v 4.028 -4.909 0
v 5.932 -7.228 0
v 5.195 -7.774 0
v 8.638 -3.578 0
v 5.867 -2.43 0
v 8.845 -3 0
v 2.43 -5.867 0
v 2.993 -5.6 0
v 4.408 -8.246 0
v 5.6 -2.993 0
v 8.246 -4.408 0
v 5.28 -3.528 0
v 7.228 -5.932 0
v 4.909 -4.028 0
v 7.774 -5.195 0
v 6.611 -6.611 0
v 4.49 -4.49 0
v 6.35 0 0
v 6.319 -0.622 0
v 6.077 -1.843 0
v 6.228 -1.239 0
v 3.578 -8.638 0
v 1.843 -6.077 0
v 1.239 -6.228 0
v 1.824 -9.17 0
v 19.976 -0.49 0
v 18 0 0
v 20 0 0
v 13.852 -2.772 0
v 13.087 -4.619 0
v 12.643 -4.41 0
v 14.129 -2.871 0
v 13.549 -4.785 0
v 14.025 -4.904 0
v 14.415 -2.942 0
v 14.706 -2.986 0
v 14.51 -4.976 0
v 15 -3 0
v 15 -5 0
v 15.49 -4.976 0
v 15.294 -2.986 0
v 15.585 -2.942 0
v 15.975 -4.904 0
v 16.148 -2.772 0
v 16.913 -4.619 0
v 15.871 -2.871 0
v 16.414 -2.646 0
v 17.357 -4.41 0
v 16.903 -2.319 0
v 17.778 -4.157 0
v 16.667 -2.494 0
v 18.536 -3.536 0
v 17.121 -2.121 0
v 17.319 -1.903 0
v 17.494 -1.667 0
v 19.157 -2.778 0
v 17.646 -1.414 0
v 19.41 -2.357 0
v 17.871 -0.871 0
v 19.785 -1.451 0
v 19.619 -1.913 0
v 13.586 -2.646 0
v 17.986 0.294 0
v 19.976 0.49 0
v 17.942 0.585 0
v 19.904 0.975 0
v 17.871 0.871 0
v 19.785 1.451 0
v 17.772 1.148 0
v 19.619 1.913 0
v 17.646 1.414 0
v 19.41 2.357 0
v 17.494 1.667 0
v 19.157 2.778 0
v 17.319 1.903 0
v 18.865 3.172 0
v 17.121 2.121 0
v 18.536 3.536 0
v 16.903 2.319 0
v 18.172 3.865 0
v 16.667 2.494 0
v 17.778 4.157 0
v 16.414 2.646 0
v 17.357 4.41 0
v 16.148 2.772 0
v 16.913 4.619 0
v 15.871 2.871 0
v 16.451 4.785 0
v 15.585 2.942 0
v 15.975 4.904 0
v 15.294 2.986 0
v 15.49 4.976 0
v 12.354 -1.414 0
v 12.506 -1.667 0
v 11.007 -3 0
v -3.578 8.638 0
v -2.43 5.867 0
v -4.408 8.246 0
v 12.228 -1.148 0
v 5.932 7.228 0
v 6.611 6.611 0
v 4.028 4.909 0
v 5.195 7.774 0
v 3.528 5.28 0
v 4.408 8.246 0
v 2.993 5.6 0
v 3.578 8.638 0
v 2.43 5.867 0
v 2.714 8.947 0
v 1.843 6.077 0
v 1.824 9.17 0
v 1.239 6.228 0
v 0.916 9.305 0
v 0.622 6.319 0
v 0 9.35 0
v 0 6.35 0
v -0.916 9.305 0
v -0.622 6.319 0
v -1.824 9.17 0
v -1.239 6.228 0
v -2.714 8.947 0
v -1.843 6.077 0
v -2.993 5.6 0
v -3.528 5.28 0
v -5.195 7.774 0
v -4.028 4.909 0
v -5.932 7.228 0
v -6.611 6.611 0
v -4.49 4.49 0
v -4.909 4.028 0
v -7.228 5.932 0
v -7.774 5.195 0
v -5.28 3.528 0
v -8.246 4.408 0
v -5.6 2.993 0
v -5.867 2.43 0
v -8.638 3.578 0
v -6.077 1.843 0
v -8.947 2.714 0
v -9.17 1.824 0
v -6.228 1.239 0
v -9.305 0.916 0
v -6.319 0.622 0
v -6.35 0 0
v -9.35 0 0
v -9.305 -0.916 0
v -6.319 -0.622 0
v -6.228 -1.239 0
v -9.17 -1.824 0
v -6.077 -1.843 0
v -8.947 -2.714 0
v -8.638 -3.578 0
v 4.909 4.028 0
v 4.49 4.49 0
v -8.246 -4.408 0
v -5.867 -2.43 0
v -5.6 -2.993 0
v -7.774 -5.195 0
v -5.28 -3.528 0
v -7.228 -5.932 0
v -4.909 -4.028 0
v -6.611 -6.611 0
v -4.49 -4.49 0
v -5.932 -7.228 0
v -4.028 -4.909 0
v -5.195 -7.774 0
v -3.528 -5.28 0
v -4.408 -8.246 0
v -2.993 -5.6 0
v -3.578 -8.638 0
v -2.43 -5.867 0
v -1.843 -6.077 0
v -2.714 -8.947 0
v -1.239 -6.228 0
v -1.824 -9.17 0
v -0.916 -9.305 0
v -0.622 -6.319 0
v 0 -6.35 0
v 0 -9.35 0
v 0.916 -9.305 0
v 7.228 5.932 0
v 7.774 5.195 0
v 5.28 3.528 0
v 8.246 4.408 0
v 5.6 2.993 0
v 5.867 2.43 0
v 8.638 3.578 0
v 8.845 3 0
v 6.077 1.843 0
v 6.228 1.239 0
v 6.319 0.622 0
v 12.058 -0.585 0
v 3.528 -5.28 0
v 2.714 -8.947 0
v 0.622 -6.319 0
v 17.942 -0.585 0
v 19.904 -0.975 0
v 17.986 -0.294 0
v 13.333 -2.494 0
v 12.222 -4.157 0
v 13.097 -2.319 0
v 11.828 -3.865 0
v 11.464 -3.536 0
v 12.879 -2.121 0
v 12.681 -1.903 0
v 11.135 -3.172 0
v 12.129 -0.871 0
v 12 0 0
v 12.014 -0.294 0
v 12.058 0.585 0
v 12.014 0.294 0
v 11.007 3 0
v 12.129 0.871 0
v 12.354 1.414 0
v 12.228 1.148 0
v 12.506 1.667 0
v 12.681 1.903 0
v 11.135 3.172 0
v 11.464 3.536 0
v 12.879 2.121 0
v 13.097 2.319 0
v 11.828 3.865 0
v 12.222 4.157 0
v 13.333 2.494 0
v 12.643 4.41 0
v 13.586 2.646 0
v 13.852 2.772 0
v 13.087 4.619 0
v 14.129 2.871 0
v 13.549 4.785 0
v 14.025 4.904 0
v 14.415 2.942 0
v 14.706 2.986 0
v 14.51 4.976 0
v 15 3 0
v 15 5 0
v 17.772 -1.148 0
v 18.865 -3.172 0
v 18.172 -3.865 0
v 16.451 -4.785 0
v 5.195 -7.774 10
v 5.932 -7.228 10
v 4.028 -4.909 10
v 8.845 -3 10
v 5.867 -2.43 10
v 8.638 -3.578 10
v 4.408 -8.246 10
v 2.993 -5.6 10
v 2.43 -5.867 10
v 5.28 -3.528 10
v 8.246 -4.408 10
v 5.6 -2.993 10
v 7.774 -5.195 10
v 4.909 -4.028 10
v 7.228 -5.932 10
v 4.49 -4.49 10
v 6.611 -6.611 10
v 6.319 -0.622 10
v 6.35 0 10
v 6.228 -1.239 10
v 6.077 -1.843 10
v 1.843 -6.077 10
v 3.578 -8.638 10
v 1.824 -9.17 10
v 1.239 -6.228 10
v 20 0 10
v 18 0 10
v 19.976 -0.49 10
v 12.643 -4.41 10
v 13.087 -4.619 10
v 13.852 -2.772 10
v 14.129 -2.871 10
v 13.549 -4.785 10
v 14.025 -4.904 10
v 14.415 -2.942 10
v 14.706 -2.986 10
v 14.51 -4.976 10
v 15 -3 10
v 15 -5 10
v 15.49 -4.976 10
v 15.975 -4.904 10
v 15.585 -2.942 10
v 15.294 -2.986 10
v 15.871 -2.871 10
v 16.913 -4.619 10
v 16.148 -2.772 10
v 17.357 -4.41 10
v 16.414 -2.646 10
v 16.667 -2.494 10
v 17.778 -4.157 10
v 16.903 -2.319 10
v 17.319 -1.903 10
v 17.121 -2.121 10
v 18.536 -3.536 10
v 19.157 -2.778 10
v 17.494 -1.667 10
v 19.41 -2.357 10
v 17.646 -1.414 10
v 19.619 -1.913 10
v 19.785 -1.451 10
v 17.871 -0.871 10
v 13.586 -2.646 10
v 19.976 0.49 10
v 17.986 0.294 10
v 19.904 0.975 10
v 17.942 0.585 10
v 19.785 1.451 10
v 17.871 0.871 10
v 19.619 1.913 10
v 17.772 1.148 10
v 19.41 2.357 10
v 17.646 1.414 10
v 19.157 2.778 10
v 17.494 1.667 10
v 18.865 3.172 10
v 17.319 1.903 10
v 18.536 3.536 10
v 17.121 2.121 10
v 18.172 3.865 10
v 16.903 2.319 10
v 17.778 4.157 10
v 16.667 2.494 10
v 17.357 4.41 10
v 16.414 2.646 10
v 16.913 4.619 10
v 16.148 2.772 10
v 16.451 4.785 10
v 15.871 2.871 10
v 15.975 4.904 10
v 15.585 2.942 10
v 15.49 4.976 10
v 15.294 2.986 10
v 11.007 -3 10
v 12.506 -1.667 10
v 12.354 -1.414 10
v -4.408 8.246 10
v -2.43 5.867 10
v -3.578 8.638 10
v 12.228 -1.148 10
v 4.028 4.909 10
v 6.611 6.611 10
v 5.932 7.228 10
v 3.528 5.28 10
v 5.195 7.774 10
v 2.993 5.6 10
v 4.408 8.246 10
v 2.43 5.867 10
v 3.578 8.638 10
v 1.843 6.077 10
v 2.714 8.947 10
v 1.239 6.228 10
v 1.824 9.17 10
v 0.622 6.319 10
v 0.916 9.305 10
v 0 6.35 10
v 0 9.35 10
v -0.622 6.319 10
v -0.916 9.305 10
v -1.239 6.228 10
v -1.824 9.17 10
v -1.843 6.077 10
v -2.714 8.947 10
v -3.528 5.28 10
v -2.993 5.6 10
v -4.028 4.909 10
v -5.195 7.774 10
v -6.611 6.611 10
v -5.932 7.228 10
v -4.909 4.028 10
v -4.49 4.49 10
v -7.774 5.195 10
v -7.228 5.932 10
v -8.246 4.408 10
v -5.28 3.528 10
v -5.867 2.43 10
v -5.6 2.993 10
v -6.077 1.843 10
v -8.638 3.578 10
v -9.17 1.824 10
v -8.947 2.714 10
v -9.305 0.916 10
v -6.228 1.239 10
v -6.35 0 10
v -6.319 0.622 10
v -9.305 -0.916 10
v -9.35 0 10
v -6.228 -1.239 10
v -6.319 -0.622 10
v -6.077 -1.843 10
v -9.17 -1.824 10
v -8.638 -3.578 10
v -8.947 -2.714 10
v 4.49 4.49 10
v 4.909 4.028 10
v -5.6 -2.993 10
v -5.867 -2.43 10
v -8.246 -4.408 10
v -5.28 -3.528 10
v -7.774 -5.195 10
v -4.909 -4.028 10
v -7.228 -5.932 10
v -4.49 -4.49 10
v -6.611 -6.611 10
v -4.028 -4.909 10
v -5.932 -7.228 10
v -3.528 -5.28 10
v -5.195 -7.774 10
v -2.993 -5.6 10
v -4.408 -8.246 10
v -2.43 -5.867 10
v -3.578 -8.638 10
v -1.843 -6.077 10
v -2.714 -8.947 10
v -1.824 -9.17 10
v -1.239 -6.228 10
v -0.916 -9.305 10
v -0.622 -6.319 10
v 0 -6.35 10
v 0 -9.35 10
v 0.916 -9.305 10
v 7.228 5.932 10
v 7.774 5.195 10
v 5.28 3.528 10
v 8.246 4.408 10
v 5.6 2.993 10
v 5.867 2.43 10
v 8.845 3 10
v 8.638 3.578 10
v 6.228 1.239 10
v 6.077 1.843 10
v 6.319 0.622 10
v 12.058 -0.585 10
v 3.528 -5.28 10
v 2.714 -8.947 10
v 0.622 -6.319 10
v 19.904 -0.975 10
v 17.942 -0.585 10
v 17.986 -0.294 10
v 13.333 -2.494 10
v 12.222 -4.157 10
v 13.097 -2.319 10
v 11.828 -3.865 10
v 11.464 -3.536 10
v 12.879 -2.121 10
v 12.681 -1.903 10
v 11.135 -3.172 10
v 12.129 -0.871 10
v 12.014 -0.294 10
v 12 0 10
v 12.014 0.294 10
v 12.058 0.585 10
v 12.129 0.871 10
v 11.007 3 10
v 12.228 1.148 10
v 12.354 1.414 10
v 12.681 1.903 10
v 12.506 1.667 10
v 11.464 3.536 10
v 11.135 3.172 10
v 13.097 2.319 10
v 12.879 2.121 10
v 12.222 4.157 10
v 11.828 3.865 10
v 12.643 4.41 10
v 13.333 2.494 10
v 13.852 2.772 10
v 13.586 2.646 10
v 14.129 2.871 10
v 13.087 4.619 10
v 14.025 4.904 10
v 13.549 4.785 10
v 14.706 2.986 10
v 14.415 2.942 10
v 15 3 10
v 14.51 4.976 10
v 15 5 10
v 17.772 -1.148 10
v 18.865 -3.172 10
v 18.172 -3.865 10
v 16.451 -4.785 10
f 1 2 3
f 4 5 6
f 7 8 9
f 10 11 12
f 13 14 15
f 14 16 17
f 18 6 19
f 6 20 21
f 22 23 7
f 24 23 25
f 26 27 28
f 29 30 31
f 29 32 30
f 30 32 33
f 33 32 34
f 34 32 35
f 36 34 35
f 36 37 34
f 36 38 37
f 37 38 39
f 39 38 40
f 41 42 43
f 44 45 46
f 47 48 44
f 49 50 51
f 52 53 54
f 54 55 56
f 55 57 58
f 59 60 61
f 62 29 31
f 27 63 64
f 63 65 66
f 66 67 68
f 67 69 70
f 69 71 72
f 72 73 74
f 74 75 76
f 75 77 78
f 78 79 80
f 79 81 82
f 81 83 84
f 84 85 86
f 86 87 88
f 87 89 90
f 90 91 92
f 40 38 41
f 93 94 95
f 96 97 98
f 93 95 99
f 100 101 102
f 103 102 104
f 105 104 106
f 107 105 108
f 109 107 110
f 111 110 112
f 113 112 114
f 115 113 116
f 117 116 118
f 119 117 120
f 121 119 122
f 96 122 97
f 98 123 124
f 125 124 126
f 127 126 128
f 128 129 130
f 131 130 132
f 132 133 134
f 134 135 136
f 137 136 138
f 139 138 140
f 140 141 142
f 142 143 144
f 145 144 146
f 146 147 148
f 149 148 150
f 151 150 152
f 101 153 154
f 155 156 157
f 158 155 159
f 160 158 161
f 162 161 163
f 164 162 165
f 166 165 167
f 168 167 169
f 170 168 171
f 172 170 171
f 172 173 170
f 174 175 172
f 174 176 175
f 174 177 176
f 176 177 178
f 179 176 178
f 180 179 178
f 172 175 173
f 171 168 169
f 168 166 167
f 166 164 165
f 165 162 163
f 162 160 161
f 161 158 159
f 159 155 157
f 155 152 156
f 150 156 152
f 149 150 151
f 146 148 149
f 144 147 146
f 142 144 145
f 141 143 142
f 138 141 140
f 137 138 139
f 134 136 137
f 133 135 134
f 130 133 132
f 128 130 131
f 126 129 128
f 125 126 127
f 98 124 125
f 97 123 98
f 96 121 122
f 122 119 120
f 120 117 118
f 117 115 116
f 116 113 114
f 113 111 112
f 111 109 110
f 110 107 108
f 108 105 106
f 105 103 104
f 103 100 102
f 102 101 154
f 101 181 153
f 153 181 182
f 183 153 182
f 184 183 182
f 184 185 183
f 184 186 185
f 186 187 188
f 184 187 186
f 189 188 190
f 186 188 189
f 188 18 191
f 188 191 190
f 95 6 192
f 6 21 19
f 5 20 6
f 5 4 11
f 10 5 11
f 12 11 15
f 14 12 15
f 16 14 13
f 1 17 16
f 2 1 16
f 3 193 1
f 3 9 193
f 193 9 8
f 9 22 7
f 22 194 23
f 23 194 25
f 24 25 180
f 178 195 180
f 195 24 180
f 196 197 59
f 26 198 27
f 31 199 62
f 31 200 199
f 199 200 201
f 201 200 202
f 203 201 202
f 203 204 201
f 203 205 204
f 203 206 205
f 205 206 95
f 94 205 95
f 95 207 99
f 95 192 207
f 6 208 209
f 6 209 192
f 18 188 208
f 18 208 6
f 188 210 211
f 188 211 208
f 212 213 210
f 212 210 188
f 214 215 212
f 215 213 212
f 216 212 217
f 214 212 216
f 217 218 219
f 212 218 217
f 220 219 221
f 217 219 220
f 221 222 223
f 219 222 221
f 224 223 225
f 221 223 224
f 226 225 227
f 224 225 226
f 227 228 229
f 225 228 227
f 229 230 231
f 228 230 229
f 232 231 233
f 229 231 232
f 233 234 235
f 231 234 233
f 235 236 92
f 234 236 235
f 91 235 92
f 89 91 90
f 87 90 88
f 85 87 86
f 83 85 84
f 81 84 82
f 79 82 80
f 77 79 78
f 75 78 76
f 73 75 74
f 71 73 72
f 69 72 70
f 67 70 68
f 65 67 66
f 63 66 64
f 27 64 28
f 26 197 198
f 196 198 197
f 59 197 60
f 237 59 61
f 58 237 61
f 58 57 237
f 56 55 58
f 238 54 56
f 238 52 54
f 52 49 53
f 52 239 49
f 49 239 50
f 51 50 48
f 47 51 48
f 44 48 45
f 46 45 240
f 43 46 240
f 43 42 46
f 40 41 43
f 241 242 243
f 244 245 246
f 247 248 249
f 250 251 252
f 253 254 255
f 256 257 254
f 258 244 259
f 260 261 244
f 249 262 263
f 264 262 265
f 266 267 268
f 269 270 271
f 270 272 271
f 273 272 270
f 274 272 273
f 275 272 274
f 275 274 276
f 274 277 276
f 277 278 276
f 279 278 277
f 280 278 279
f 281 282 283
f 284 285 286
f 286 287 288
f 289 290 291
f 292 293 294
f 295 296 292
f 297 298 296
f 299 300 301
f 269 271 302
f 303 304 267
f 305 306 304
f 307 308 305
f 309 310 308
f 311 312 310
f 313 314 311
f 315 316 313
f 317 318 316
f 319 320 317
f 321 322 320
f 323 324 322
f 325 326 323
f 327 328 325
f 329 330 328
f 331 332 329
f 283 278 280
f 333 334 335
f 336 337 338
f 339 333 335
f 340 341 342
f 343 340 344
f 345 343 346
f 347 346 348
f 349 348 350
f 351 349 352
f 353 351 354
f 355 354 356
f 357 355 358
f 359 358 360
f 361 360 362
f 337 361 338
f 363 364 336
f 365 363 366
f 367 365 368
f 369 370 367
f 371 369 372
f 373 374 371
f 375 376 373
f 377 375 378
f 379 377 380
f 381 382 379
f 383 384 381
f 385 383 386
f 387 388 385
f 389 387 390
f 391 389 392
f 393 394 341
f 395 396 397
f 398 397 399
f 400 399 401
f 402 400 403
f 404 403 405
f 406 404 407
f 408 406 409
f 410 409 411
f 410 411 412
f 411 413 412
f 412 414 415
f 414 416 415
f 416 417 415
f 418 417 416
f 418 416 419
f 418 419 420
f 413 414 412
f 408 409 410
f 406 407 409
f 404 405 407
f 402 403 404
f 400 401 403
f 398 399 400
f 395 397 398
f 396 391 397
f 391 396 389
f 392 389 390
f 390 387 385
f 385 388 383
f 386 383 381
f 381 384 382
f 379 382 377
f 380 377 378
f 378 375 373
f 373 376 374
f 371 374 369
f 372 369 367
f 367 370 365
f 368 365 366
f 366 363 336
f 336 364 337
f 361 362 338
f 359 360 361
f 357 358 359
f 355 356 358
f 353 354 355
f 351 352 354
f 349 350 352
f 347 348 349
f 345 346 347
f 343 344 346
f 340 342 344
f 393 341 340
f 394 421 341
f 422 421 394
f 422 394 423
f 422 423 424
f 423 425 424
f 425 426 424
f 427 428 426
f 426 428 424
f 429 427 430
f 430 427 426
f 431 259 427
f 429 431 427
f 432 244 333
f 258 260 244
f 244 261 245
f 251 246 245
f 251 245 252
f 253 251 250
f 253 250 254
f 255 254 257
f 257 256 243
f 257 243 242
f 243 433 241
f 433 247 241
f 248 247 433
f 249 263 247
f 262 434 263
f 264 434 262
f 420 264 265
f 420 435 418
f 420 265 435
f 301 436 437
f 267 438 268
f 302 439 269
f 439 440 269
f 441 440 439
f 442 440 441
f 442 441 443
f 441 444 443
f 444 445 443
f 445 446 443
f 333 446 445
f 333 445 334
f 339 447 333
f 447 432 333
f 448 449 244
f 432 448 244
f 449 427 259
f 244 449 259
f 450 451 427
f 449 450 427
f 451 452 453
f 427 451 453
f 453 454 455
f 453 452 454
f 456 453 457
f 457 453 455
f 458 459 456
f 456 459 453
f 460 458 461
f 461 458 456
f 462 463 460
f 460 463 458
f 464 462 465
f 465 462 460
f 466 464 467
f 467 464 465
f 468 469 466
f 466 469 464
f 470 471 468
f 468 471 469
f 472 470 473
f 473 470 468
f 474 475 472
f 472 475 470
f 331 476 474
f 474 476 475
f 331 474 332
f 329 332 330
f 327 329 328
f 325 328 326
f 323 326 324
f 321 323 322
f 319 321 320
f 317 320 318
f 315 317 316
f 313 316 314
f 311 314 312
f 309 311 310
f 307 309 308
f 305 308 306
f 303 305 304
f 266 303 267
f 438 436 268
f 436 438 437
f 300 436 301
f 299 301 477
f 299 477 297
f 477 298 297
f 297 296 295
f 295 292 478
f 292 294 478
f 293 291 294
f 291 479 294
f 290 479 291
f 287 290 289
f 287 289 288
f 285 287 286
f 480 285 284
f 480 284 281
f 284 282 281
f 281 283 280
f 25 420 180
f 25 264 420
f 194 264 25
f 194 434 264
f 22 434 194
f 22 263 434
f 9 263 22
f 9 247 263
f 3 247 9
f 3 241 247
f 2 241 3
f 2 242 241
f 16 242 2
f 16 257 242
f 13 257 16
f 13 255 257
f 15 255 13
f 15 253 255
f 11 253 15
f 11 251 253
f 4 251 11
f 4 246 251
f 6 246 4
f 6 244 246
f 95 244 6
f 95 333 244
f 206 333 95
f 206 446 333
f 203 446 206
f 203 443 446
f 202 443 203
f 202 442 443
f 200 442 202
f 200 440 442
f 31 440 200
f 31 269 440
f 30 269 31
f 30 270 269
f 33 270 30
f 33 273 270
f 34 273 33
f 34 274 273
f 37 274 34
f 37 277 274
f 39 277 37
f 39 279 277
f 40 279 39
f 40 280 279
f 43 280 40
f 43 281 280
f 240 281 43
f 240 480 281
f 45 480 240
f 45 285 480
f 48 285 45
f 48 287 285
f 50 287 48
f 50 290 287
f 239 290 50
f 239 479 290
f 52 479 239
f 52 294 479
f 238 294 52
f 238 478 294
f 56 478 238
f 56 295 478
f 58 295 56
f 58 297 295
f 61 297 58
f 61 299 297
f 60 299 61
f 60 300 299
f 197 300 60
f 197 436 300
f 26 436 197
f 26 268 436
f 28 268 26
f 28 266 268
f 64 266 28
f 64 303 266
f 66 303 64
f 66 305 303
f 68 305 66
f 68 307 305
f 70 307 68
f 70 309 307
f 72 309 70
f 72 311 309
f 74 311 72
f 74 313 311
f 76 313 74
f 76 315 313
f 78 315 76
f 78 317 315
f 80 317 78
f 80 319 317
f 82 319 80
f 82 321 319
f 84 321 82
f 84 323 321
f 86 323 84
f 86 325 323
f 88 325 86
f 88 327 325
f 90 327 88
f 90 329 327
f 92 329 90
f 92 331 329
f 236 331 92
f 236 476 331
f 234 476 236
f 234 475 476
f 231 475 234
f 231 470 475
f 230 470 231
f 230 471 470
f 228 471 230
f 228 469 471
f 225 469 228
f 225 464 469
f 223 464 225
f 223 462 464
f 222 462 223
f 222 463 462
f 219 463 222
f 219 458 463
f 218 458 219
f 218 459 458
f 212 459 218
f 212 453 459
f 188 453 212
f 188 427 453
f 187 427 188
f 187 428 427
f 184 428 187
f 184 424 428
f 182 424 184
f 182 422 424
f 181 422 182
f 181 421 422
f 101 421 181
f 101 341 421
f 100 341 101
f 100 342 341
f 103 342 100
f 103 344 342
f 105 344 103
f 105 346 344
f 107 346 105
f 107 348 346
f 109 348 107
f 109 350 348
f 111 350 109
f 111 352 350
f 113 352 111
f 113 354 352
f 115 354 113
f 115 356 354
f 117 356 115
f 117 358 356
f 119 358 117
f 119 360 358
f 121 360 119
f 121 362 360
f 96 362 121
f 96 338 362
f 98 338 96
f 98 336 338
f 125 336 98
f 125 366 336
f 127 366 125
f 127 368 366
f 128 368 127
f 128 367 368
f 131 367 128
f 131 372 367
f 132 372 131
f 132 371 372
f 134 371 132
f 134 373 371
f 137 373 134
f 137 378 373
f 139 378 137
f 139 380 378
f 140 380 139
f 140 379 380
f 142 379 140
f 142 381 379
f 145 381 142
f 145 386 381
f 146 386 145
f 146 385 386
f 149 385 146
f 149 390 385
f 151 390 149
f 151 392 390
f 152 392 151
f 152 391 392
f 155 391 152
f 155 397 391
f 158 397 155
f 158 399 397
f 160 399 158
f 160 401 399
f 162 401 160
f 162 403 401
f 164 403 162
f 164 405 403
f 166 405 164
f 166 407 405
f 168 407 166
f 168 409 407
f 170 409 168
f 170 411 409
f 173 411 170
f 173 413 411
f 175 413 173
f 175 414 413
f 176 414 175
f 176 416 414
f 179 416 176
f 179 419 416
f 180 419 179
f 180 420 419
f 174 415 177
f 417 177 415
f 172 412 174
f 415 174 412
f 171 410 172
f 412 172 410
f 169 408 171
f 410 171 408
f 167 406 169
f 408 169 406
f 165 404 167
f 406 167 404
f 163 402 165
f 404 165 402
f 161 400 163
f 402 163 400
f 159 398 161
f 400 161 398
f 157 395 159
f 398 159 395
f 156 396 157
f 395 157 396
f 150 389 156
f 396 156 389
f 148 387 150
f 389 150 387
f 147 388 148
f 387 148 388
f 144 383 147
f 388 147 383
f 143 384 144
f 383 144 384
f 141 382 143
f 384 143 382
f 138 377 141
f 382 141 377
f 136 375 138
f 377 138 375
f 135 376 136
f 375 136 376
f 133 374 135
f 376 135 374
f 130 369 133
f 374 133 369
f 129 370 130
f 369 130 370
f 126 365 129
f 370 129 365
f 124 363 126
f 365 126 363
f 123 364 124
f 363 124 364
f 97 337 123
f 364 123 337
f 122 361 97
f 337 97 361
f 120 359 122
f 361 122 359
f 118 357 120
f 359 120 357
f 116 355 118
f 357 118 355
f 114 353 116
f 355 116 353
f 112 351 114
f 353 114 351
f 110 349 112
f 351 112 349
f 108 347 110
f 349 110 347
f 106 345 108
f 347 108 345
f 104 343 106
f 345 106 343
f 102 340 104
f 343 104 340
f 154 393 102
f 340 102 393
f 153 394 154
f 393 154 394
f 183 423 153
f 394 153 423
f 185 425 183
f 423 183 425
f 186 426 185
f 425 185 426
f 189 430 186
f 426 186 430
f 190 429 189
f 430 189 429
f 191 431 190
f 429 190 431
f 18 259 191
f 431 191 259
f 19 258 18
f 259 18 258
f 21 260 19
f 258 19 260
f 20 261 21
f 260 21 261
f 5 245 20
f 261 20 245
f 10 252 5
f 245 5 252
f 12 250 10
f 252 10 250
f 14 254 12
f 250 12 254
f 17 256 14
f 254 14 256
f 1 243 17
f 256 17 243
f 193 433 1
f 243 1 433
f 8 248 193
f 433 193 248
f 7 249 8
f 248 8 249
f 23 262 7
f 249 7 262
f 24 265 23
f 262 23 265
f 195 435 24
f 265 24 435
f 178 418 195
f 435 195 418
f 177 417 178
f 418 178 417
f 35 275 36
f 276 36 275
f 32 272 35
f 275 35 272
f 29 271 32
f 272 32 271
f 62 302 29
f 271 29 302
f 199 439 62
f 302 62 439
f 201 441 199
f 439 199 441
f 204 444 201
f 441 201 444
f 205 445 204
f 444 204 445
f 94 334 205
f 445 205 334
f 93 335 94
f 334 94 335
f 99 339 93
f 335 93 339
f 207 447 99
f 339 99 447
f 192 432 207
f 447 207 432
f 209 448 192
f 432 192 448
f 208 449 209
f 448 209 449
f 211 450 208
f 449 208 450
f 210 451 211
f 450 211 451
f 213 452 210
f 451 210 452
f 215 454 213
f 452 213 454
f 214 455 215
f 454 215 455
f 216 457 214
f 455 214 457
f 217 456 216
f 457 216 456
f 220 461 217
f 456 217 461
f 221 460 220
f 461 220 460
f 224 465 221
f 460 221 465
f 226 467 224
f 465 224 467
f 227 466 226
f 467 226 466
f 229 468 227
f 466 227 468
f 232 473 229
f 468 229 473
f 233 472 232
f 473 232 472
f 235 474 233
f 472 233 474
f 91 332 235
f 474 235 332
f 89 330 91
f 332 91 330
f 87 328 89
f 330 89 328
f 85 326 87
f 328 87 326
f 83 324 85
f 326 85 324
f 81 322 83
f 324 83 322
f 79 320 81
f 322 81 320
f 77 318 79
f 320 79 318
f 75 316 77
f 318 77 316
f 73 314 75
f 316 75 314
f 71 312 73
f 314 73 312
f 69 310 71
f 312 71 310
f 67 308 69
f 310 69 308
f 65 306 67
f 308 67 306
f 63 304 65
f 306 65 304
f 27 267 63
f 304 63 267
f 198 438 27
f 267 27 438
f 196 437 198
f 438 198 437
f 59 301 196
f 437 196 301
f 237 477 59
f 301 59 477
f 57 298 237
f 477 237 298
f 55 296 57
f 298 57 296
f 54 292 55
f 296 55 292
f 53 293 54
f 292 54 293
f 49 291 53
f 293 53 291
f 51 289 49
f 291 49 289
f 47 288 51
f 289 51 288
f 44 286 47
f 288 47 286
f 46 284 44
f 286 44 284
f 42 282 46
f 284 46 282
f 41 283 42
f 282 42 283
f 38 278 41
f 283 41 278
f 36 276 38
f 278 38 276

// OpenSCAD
// Snap-on clip for 12.7 mm lab stand rod and 6 mm ID tubing
// Printed flat: 10 mm tall extrusion (Z) of a 2-D profile in the XY plane.

// Extrusion height (Z)
extrusion_height = 10;

// Rod ring dimensions
rod_ring_id = 12.7;          // Inner diameter of rod ring
rod_ring_wall = 3;           // Wall thickness of rod ring
rod_ring_od = rod_ring_id + 2 * rod_ring_wall; // Outer diameter of rod ring (18.7)

// Rod ring opening dimensions
rod_opening_width = 10;      // Width of the opening on the -X side
rod_opening_half_width = rod_opening_width / 2;

// Tubing ring dimensions
tubing_ring_id = 6;          // Inner diameter of tubing ring
tubing_ring_wall = 2;        // Wall thickness of tubing ring
tubing_ring_od = tubing_ring_id + 2 * tubing_ring_wall; // Outer diameter of tubing ring (10)
tubing_ring_center_x = 15;   // X position of tubing ring center

// Tubing ring opening dimensions
tubing_opening_width = 4.5;  // Width of the opening on the +X side
tubing_opening_half_width = tubing_opening_width / 2;

// Bridge dimensions
bridge_x_start = 8;          // Start X of the bridge
bridge_x_end = 12;           // End X of the bridge
bridge_width = 6;            // Width of the bridge in Y
bridge_half_width = bridge_width / 2;

// Resolution for curved shapes
$fn = 64;

// Extrude the profile to create the 3D part
linear_extrude(height = extrusion_height, center = false, convexity = 10)
{
    // Union of all profile parts
    union()
    {
        // Rod ring centered at origin with opening on -X side
        difference()
        {
            // Outer circle of rod ring
            circle(d = rod_ring_od);
            
            // Inner hole of rod ring
            circle(d = rod_ring_id);
            
            // Opening cut on -X side: x < 0 and -5 < y < 5
            // The spec says: "everything with x < 0 and -5 < y < 5 is removed from this ring"
            // We cut a large rectangle covering x < 0 and y in [-5, 5]
            // To ensure it cuts through the ring completely, we extend it far to the left
            translate([-rod_ring_od - 1, 0])
                square([rod_ring_od + 1, rod_opening_width + 0.02], center = true);
        }
        
        // Tubing ring centered at (15, 0) with opening on +X side
        translate([tubing_ring_center_x, 0])
        difference()
        {
            // Outer circle of tubing ring
            circle(d = tubing_ring_od);
            
            // Inner hole of tubing ring
            circle(d = tubing_ring_id);
            
            // Opening cut on +X side: x > 15 and -2.25 < y < 2.25
            // The spec says: "x > 15 and -2.25 < y < 2.25"
            // We cut a large rectangle covering x > 0 (relative to center) and y in [-2.25, 2.25]
            // To ensure it cuts through the ring completely, we extend it far to the right
            translate([tubing_ring_od + 1, 0])
                square([tubing_ring_od + 1, tubing_opening_width + 0.02], center = true);
        }
        
        // Bridge connecting the two rings
        // Spec: "solid bridge 6 mm wide (Y) between x = 8 and x = 12"
        translate([(bridge_x_start + bridge_x_end) / 2, 0])
            square([bridge_x_end - bridge_x_start, bridge_width], center = true);
    }
}
